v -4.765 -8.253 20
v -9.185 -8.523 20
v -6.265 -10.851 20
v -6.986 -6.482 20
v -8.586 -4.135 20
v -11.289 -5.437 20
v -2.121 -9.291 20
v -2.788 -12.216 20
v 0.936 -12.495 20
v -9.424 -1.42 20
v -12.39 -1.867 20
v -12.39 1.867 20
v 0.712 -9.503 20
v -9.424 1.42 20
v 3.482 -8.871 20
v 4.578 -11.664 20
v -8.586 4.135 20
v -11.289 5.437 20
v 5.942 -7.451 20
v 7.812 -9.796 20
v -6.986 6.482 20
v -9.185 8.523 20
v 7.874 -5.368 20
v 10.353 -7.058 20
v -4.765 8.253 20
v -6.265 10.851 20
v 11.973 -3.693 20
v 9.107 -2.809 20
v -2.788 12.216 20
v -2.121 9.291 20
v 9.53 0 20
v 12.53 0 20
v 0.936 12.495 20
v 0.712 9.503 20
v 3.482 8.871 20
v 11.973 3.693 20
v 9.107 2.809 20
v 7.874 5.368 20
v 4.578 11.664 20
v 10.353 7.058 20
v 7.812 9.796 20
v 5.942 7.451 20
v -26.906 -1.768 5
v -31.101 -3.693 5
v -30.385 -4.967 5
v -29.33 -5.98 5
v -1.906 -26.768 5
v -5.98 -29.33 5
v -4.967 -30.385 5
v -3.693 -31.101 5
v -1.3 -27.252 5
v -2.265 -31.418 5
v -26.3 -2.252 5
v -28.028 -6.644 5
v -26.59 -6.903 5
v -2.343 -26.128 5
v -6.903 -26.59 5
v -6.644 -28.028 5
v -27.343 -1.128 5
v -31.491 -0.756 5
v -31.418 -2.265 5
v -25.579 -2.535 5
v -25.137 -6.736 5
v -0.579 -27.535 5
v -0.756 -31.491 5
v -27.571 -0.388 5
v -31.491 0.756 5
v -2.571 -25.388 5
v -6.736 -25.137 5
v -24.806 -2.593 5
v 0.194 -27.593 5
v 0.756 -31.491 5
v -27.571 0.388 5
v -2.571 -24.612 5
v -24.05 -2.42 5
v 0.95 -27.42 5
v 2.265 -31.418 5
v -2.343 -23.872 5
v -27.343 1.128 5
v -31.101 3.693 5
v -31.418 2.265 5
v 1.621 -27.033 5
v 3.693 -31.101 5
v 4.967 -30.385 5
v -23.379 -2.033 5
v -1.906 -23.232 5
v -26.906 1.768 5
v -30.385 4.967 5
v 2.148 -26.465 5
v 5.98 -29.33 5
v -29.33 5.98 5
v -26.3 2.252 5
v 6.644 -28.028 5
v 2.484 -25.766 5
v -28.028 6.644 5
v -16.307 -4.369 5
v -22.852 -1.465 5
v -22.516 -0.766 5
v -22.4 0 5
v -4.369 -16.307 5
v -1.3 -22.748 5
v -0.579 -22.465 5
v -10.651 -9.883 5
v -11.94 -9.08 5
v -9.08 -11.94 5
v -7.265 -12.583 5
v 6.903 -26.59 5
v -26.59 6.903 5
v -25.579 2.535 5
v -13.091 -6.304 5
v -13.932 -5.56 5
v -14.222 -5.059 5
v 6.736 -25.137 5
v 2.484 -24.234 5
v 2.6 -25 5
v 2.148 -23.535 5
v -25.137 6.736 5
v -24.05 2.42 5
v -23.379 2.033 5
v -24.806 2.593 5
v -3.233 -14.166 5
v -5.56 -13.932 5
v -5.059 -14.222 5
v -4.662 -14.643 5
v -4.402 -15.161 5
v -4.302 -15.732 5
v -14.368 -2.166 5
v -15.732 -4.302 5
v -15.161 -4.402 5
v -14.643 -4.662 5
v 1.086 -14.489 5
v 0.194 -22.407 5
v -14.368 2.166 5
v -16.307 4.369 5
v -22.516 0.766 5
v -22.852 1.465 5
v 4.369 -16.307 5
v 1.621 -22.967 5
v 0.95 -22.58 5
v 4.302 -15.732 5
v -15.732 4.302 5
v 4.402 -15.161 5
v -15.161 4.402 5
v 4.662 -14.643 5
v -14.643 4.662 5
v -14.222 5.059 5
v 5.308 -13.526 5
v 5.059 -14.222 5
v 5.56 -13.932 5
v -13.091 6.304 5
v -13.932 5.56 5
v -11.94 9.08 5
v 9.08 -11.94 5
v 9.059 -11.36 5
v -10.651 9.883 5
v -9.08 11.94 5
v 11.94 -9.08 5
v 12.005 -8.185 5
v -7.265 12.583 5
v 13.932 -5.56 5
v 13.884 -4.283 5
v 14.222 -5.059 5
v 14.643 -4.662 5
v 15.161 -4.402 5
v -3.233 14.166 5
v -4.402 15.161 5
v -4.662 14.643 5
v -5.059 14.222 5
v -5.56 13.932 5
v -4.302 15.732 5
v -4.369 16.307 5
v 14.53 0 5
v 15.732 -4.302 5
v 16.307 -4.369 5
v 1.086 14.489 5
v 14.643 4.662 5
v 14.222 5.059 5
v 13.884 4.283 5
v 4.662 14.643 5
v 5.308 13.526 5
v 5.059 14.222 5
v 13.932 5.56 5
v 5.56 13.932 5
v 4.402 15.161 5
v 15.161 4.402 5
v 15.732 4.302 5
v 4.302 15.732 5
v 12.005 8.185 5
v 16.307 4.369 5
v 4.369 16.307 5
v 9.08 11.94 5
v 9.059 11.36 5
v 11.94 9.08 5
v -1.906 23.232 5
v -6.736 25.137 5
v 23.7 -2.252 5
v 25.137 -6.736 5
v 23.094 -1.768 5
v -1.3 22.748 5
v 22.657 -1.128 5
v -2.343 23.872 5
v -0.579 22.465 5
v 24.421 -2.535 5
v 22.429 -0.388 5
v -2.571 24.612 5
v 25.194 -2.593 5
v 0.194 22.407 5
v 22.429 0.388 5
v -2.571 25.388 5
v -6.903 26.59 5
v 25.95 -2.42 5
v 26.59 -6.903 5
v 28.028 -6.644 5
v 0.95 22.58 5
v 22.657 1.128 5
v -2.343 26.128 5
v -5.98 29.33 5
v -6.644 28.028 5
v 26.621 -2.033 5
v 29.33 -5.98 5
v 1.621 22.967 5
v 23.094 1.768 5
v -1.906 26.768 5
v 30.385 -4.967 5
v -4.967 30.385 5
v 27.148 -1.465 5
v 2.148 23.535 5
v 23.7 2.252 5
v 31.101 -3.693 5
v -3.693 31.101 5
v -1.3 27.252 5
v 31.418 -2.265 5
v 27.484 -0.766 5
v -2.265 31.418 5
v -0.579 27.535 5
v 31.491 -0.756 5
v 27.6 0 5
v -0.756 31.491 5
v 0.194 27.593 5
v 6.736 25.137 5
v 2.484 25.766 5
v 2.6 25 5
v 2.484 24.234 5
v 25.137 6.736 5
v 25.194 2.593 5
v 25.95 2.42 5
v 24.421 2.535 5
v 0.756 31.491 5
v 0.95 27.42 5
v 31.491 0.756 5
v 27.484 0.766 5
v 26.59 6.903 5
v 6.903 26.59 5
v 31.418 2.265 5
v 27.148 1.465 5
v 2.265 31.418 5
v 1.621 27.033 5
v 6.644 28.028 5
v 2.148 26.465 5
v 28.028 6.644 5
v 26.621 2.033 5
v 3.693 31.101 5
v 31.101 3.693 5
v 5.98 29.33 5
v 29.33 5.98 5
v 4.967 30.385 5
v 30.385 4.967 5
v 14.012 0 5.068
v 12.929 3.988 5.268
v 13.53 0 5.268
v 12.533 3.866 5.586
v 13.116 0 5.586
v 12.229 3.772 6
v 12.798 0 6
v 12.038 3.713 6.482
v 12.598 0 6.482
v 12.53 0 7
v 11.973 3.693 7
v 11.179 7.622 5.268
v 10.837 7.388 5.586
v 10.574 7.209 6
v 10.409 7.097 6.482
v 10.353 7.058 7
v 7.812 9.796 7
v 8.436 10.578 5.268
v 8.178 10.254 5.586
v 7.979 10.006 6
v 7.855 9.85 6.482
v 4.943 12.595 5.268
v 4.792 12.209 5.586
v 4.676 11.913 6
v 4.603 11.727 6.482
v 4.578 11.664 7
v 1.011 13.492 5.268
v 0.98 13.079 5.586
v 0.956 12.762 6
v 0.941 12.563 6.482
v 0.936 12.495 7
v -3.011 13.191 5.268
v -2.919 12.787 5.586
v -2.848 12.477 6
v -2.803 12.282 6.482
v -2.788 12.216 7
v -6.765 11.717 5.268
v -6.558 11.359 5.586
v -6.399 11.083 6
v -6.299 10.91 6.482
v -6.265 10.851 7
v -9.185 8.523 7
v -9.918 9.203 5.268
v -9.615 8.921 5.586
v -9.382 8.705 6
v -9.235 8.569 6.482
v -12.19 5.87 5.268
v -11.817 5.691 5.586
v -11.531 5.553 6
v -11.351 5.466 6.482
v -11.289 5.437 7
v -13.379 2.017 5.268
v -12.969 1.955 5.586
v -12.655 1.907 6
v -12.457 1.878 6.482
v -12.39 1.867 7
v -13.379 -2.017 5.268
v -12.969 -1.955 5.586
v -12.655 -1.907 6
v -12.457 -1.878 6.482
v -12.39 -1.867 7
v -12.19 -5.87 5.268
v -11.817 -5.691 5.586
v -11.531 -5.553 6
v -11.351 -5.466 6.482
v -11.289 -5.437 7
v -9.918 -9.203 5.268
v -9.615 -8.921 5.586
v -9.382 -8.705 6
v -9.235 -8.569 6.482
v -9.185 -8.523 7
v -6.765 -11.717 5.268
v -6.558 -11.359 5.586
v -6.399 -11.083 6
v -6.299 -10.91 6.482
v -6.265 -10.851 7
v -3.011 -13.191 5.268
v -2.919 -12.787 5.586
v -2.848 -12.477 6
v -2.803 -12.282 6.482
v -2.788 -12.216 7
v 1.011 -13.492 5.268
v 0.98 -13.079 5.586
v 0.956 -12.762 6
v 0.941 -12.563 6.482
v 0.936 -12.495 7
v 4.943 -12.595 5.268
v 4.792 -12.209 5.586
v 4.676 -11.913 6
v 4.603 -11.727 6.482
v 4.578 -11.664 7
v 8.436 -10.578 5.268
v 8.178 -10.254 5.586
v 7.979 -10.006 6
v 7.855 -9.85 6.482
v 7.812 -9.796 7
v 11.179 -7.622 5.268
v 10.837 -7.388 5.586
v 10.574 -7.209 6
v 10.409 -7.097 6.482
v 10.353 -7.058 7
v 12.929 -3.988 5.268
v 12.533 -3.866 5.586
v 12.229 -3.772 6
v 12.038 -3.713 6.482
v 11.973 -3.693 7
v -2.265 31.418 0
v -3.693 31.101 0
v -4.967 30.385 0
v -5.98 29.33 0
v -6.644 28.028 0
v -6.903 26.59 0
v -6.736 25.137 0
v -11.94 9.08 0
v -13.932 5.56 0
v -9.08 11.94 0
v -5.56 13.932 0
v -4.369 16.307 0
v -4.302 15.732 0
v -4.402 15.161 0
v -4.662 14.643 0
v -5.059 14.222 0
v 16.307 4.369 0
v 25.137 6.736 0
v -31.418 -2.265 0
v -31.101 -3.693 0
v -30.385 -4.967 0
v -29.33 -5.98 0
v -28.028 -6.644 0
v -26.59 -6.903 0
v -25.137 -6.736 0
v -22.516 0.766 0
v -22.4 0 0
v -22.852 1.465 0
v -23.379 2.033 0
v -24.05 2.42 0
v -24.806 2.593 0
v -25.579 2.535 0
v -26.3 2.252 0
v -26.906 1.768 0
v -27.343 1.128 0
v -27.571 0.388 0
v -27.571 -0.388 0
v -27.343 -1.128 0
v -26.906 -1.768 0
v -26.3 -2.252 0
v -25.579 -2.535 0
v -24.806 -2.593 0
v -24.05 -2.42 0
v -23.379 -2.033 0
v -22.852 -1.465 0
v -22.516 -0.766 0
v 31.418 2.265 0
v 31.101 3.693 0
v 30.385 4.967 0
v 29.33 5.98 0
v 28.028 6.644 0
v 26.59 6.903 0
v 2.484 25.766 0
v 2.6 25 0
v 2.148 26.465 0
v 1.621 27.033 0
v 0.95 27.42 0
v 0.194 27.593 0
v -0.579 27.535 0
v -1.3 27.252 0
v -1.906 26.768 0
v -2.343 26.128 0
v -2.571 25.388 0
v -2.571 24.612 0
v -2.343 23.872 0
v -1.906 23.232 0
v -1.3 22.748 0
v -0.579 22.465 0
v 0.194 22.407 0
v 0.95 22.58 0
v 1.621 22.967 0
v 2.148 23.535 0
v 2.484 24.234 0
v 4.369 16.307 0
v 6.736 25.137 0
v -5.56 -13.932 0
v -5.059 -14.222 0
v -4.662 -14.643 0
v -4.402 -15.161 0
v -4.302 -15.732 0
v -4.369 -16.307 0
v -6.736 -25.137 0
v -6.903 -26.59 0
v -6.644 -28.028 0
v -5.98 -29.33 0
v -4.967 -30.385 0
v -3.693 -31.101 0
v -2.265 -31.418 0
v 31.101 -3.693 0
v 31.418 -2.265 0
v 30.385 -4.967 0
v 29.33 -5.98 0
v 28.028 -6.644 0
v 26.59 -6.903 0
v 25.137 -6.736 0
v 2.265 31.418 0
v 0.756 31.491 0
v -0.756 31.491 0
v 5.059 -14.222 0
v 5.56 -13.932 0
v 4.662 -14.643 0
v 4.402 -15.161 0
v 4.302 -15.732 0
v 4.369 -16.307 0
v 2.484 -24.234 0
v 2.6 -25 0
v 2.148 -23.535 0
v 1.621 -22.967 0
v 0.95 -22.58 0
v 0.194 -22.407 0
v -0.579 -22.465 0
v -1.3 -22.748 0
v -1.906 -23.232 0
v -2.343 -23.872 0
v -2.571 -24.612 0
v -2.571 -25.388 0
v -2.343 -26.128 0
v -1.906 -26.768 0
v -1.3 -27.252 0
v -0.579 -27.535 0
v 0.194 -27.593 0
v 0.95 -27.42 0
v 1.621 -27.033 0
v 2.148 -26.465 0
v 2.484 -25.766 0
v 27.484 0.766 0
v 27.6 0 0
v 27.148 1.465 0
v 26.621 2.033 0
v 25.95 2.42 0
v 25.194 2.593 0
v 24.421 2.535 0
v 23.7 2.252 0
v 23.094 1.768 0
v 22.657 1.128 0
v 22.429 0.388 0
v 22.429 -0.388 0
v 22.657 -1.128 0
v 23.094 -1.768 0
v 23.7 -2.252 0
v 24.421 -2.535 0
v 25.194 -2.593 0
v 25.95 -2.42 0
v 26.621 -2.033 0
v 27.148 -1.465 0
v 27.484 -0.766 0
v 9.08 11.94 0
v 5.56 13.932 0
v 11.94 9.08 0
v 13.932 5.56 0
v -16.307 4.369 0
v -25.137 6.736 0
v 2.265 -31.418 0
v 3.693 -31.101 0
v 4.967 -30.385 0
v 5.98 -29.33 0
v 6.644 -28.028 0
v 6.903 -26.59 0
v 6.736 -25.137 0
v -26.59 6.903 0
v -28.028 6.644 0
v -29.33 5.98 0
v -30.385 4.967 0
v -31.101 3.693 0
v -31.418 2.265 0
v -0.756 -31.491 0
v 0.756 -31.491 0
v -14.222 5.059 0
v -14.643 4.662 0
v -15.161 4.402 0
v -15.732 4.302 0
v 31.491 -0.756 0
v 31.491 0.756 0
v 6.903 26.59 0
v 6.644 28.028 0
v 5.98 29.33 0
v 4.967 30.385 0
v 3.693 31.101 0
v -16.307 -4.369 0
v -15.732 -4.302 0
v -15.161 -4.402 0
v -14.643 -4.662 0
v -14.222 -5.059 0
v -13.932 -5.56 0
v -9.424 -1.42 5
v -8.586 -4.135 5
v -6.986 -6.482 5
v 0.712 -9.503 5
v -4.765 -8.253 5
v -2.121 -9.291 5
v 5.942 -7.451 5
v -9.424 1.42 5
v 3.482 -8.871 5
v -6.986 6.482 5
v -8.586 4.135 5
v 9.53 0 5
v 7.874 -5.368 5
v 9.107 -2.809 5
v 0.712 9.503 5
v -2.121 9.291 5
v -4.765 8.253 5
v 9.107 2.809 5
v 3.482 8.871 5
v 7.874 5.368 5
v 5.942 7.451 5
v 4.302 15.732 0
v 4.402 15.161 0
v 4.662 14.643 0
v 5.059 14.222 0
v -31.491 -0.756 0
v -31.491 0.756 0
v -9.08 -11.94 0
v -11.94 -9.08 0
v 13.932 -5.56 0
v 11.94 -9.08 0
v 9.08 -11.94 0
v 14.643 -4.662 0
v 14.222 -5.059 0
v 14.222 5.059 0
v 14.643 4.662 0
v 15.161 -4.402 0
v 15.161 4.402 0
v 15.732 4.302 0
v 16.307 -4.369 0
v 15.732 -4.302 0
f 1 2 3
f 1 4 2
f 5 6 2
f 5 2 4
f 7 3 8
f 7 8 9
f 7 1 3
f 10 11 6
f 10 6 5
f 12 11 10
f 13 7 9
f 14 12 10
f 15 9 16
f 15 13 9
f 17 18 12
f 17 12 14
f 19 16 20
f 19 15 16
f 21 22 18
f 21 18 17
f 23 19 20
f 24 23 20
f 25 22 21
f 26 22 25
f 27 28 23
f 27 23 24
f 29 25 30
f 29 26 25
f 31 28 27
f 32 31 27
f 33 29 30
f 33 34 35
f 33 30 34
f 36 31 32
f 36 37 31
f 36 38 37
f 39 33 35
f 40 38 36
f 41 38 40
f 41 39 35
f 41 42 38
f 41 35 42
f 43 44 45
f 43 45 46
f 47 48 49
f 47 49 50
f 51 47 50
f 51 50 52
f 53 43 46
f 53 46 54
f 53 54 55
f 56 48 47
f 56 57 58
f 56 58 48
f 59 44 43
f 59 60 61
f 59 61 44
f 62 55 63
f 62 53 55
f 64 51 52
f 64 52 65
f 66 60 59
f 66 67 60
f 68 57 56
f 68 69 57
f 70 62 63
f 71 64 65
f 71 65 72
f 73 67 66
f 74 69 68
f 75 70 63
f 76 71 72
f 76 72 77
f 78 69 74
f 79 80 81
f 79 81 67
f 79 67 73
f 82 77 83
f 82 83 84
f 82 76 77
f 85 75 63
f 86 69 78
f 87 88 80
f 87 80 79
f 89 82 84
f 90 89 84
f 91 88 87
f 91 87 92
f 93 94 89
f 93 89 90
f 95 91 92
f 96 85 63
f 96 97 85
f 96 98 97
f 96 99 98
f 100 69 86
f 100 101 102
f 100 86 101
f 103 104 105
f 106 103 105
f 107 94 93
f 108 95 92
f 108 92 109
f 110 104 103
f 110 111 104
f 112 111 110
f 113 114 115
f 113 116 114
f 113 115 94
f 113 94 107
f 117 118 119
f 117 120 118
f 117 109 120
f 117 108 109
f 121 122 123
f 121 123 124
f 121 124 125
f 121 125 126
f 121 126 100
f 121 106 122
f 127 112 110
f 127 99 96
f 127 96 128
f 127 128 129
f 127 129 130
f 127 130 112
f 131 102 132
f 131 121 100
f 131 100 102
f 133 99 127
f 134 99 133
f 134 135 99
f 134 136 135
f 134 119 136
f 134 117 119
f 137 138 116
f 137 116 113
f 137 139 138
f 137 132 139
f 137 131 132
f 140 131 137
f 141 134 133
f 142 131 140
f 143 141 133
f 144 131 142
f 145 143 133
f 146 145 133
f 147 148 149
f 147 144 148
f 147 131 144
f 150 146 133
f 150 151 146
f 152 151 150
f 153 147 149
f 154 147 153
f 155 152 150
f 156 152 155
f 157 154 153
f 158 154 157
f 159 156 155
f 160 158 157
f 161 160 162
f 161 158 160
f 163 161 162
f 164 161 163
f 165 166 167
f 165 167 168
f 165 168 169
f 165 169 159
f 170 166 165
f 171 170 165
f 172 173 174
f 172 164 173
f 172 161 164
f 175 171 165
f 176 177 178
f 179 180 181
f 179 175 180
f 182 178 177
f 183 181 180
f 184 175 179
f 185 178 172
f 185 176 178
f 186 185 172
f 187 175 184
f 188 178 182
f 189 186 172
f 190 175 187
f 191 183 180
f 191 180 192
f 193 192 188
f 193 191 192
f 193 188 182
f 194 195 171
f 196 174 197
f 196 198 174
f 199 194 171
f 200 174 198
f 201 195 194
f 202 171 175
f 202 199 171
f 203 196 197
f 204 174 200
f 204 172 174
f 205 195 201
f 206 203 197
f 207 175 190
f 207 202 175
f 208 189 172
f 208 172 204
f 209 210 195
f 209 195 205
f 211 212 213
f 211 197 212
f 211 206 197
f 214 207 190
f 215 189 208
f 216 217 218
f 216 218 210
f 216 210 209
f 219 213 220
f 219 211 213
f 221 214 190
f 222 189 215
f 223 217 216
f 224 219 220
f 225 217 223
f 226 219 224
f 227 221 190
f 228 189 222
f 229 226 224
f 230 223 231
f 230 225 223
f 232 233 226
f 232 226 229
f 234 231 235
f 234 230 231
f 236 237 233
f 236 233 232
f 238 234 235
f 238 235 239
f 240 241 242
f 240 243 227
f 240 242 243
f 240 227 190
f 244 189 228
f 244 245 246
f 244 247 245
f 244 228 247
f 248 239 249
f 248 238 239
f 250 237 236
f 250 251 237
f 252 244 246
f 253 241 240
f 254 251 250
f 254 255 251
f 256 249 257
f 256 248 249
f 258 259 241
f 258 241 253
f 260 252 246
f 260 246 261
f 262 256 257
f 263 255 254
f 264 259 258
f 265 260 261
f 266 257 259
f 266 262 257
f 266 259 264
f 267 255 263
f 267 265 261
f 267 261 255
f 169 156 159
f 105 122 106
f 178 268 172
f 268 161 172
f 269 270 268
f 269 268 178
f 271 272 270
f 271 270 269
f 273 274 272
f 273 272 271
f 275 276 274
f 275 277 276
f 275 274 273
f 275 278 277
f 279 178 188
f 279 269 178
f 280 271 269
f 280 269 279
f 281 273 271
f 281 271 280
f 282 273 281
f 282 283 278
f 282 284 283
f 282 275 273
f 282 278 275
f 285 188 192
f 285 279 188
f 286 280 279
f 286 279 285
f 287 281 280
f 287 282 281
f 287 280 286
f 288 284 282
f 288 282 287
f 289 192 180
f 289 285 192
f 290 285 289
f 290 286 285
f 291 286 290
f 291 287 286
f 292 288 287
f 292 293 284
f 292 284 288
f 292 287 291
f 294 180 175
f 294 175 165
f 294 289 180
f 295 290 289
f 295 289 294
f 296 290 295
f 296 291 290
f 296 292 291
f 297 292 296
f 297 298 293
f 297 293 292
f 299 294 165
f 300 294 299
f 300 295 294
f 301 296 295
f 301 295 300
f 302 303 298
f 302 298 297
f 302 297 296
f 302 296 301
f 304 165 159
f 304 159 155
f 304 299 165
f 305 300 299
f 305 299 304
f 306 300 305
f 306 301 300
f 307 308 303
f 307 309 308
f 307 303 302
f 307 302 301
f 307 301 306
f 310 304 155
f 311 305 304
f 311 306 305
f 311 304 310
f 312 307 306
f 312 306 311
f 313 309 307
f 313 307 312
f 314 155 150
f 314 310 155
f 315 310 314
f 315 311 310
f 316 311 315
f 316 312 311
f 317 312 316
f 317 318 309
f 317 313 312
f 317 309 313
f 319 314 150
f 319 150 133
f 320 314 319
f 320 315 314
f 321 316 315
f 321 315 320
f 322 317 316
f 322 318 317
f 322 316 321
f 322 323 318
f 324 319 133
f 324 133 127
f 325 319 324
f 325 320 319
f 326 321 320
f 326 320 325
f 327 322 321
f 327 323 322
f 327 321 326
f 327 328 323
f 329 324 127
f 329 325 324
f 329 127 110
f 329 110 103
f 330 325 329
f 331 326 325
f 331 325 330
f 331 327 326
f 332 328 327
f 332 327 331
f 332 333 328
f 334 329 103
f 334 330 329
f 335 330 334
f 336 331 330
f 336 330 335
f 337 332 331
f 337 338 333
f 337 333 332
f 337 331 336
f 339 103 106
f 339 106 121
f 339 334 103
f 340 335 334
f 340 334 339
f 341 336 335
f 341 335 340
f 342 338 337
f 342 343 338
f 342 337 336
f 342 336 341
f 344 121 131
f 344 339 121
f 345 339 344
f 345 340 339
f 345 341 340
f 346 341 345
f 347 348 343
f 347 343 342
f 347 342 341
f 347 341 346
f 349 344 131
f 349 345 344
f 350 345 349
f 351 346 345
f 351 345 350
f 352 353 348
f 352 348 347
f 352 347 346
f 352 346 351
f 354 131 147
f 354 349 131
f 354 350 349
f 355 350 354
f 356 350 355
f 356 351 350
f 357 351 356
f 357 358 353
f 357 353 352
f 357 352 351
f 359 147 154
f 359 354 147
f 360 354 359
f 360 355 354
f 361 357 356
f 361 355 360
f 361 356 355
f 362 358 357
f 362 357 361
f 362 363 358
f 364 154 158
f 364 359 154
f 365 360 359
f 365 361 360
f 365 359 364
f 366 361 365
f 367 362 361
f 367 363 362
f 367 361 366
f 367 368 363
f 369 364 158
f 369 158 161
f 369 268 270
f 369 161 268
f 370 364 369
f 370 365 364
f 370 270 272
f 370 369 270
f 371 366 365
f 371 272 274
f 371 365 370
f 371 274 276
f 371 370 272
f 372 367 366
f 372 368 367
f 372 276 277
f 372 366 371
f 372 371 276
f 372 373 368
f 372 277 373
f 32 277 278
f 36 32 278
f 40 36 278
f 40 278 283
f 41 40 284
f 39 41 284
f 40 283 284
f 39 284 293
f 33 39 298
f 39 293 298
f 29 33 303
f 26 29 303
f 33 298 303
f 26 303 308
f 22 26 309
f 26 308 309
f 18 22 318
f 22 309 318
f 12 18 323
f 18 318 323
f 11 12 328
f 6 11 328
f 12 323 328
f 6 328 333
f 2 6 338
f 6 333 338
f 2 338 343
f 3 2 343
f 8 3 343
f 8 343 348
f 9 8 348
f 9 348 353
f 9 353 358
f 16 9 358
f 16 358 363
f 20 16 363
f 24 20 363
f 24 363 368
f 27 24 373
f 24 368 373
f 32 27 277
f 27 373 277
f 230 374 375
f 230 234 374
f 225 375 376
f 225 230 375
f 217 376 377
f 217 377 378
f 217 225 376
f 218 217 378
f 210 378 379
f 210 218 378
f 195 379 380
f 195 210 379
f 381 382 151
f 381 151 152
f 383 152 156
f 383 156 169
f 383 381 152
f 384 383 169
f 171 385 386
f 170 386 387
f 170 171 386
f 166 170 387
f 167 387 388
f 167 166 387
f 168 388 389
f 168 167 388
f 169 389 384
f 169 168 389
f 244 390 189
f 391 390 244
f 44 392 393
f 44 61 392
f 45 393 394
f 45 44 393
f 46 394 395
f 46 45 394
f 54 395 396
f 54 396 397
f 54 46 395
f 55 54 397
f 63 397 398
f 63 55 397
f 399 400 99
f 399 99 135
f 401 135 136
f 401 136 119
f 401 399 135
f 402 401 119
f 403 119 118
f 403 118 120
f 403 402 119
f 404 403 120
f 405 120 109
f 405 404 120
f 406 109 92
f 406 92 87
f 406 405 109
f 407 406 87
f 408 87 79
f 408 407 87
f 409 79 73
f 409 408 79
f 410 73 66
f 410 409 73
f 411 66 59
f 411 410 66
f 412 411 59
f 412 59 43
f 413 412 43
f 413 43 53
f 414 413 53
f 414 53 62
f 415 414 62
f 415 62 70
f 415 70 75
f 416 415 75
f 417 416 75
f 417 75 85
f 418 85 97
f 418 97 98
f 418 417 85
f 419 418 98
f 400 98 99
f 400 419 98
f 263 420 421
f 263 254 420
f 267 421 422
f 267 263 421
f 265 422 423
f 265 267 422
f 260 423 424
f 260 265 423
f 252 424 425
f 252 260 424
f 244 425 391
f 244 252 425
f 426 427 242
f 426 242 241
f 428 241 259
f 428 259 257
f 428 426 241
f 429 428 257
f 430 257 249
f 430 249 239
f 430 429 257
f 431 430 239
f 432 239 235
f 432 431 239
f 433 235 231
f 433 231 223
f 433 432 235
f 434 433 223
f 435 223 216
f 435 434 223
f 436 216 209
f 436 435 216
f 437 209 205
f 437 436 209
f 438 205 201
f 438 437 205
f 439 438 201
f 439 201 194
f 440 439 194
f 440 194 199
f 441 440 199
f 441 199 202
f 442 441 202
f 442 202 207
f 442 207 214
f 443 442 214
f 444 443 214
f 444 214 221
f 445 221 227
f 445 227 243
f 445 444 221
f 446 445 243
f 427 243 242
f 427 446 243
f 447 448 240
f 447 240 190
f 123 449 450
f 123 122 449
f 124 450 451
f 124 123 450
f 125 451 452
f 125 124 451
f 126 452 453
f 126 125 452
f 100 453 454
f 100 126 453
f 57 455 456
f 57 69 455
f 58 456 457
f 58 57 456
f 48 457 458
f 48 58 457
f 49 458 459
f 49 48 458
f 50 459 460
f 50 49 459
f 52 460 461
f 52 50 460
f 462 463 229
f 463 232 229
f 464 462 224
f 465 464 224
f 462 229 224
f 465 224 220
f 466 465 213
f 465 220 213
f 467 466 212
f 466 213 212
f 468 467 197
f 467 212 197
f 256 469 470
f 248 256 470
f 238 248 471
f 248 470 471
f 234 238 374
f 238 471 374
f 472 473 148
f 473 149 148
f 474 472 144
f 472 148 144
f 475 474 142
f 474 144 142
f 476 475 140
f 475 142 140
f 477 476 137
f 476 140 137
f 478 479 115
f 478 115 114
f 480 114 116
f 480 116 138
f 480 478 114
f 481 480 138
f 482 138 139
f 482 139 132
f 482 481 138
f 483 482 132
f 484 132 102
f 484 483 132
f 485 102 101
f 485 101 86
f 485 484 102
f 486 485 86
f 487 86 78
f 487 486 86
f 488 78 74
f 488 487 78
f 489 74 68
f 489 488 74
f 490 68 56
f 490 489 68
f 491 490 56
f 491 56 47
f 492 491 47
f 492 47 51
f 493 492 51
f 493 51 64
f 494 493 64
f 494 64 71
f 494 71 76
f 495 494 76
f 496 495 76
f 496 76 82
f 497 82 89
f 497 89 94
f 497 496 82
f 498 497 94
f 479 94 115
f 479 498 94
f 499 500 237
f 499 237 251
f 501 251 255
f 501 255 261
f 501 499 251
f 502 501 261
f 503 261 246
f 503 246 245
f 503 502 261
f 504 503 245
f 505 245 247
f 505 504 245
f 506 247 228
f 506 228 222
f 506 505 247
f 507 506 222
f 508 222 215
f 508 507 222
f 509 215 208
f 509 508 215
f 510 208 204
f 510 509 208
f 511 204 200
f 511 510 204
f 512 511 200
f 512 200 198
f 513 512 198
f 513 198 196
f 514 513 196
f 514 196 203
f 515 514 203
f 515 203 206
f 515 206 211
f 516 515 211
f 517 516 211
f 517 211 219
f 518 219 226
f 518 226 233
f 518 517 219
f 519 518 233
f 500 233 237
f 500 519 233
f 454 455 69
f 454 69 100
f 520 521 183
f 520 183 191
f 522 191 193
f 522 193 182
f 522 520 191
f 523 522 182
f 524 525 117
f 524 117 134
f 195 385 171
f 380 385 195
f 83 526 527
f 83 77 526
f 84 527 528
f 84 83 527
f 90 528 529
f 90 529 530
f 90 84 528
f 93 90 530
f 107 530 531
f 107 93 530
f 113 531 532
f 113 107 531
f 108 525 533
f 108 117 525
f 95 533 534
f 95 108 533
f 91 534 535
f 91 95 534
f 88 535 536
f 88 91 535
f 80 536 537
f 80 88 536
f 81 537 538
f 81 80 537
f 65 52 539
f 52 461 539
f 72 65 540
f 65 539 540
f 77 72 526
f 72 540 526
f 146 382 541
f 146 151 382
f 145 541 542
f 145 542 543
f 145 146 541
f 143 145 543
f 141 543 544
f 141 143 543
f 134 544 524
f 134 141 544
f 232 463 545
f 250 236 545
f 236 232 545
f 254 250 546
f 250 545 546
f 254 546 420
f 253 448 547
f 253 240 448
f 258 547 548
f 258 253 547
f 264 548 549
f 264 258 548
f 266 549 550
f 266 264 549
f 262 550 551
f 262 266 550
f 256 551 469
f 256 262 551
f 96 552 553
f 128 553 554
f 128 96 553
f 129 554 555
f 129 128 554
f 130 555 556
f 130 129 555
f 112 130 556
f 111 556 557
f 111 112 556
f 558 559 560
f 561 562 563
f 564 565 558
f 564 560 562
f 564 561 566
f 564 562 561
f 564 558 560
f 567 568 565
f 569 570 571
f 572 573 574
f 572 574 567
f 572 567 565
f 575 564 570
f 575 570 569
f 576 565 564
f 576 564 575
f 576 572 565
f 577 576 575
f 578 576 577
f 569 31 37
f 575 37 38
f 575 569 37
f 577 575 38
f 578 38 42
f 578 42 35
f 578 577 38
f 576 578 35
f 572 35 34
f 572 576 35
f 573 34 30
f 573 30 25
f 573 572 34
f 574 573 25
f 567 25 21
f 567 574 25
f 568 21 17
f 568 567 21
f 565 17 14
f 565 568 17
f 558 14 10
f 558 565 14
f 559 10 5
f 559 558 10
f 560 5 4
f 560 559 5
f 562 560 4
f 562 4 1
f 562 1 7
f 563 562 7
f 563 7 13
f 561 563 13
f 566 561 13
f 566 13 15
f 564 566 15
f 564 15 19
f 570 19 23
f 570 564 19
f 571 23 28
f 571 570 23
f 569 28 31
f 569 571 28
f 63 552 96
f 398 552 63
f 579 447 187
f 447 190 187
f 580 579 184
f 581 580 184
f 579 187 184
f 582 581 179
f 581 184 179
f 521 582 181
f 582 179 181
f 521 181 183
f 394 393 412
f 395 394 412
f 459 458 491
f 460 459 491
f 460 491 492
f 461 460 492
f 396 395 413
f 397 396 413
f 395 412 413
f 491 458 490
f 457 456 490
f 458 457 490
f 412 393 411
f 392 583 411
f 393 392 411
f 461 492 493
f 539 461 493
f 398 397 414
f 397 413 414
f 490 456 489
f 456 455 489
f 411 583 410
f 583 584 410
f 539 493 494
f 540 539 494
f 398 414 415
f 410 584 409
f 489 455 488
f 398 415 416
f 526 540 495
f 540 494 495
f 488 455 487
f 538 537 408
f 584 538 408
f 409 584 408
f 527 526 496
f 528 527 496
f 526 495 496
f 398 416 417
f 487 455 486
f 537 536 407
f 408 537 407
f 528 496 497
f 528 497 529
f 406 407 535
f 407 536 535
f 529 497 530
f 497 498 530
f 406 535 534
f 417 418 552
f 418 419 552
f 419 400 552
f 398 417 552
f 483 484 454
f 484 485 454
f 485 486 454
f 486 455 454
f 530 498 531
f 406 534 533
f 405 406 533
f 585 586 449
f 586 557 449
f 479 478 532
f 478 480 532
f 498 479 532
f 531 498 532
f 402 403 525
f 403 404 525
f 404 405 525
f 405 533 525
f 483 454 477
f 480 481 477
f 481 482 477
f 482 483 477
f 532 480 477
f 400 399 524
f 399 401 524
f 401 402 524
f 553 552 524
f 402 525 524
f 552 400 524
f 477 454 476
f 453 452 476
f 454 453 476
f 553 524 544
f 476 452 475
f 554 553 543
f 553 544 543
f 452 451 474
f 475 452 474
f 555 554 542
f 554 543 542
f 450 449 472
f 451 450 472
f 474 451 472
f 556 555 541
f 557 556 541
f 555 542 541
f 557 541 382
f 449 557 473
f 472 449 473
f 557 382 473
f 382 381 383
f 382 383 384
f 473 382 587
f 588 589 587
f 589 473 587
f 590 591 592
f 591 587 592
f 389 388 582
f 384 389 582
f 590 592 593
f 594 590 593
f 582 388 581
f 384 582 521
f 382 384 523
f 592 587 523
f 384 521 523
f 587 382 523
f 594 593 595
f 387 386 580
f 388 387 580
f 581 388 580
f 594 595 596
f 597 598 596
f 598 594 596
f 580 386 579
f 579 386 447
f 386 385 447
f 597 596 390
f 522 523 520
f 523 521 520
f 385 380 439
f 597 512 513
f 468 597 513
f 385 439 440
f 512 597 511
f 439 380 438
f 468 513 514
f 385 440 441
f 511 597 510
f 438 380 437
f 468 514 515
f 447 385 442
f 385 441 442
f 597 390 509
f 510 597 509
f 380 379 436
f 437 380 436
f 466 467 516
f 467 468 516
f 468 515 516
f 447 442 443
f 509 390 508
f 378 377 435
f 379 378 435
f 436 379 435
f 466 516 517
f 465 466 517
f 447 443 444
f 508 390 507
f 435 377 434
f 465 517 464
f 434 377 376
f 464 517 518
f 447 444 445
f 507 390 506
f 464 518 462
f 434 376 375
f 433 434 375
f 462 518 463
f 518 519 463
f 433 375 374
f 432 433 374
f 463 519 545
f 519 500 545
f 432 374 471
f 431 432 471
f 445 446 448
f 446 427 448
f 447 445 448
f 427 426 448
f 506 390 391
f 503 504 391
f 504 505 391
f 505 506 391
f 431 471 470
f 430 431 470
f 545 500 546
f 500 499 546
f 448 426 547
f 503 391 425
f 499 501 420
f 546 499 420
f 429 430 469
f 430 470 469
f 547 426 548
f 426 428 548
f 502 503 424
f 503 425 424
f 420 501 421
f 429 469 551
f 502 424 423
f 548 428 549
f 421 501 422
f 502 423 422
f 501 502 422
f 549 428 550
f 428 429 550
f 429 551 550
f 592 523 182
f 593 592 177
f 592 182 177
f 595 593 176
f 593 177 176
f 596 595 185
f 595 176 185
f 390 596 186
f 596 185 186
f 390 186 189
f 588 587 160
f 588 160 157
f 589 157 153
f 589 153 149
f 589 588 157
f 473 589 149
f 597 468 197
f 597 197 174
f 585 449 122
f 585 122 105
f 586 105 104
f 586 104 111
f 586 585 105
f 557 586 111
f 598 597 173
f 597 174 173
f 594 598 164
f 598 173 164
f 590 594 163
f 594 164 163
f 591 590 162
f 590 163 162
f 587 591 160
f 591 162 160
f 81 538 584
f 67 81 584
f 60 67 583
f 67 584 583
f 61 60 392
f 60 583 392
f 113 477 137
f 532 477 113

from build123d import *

# Parameters (mm, degrees)
SKETCH1_R           = 31.5
SKETCH1_R_2         = 2.6
BOSS_EXTRUDE1_DEPTH = 5
SKETCH2_R           = 12.53
SKETCH2_R_2         = 9.53
BOSS_EXTRUDE2_DEPTH = 15
CUT_EXTRUDE1_START  = -7
CUT_EXTRUDE1_DEPTH  = 7
FILLET1_R           = 5
FILLET2_R           = 2
FILLET3_R           = 2


with BuildPart() as part:
    # Sketch1 → Boss-Extrude1 (new body)
    with BuildSketch(Plane.XY):
        Circle(SKETCH1_R)
        with Locations((0, 25)):
            Circle(SKETCH1_R_2, mode=Mode.SUBTRACT)
        with Locations((25, 0)):
            Circle(SKETCH1_R_2, mode=Mode.SUBTRACT)
        with Locations((0, -25)):
            Circle(SKETCH1_R_2, mode=Mode.SUBTRACT)
        with Locations((-25, 0)):
            Circle(SKETCH1_R_2, mode=Mode.SUBTRACT)
    extrude(amount=BOSS_EXTRUDE1_DEPTH)

    # Sketch2 → Boss-Extrude2 (add)
    with BuildSketch(Plane.XY.offset(5)):
        Circle(SKETCH2_R)
        Circle(SKETCH2_R_2, mode=Mode.SUBTRACT)
    extrude(amount=BOSS_EXTRUDE2_DEPTH)

    # Sketch3 → Cut-Extrude1 (cut)
    with BuildSketch(Plane.XY.offset(5).offset(CUT_EXTRUDE1_START)):
        with BuildLine():
            ThreePointArc((-14.488887394, 3.882285677), (-10.606601718, 10.606601718), (-3.882285677, 14.488887394))
            Line((-3.882285677, 14.488887394), (-8.152799921, 30.426663528))
            ThreePointArc((-8.152799921, 30.426663528), (-22.273863607, 22.273863607), (-30.426663528, 8.152799921))
            Line((-30.426663528, 8.152799921), (-14.488887394, 3.882285677))
        make_face()
        with BuildLine():
            Line((8.152799921, 30.426663528), (3.882285677, 14.488887394))
            ThreePointArc((3.882285677, 14.488887394), (10.606601718, 10.606601718), (14.488887394, 3.882285677))
            Line((14.488887394, 3.882285677), (30.426663528, 8.152799921))
            ThreePointArc((30.426663528, 8.152799921), (22.273863607, 22.273863607), (8.152799921, 30.426663528))
        make_face()
        with BuildLine():
            Line((30.426663528, -8.152799921), (14.488887394, -3.882285677))
            ThreePointArc((14.488887394, -3.882285677), (10.606601718, -10.606601718), (3.882285677, -14.488887394))
            Line((3.882285677, -14.488887394), (8.152799921, -30.426663528))
            ThreePointArc((8.152799921, -30.426663528), (22.273863607, -22.273863607), (30.426663528, -8.152799921))
        make_face()
        with BuildLine():
            Line((-8.152799921, -30.426663528), (-3.882285677, -14.488887394))
            ThreePointArc((-3.882285677, -14.488887394), (-10.606601718, -10.606601718), (-14.488887394, -3.882285677))
            Line((-14.488887394, -3.882285677), (-30.426663528, -8.152799921))
            ThreePointArc((-30.426663528, -8.152799921), (-22.273863607, -22.273863607), (-8.152799921, -30.426663528))
        make_face()
    extrude(amount=CUT_EXTRUDE1_DEPTH, mode=Mode.SUBTRACT)

    # Fillet1
    fillet1_edges = [part.edges().sort_by_distance(p)[0] for p in [
        (-8.152799921, -30.426663528, 2.5),
        (-30.426663528, -8.152799921, 2.5),
        (30.426663528, -8.152799921, 2.5),
        (8.152799921, -30.426663528, 2.5),
        (8.152799921, 30.426663528, 2.5),
        (30.426663528, 8.152799921, 2.5),
        (-30.426663528, 8.152799921, 2.5),
        (-8.152799921, 30.426663528, 2.5),
    ]]
    fillet(fillet1_edges, radius=FILLET1_R)

    # Fillet2
    fillet2_edges = [part.edges().sort_by_distance(p)[0] for p in [
        (-14.488887394, -3.882285677, 2.5),
        (-3.882285677, -14.488887394, 2.5),
        (3.882285677, -14.488887394, 2.5),
        (14.488887394, -3.882285677, 2.5),
        (14.488887394, 3.882285677, 2.5),
        (3.882285677, 14.488887394, 2.5),
        (-3.882285677, 14.488887394, 2.5),
        (-14.488887394, 3.882285677, 2.5),
    ]]
    fillet(fillet2_edges, radius=FILLET2_R)

    # Fillet3
    fillet3_edges = [part.edges().sort_by_distance(p)[0] for p in [
        (-12.53, 0, 5),
    ]]
    fillet(fillet3_edges, radius=FILLET3_R)


solid = part.part
